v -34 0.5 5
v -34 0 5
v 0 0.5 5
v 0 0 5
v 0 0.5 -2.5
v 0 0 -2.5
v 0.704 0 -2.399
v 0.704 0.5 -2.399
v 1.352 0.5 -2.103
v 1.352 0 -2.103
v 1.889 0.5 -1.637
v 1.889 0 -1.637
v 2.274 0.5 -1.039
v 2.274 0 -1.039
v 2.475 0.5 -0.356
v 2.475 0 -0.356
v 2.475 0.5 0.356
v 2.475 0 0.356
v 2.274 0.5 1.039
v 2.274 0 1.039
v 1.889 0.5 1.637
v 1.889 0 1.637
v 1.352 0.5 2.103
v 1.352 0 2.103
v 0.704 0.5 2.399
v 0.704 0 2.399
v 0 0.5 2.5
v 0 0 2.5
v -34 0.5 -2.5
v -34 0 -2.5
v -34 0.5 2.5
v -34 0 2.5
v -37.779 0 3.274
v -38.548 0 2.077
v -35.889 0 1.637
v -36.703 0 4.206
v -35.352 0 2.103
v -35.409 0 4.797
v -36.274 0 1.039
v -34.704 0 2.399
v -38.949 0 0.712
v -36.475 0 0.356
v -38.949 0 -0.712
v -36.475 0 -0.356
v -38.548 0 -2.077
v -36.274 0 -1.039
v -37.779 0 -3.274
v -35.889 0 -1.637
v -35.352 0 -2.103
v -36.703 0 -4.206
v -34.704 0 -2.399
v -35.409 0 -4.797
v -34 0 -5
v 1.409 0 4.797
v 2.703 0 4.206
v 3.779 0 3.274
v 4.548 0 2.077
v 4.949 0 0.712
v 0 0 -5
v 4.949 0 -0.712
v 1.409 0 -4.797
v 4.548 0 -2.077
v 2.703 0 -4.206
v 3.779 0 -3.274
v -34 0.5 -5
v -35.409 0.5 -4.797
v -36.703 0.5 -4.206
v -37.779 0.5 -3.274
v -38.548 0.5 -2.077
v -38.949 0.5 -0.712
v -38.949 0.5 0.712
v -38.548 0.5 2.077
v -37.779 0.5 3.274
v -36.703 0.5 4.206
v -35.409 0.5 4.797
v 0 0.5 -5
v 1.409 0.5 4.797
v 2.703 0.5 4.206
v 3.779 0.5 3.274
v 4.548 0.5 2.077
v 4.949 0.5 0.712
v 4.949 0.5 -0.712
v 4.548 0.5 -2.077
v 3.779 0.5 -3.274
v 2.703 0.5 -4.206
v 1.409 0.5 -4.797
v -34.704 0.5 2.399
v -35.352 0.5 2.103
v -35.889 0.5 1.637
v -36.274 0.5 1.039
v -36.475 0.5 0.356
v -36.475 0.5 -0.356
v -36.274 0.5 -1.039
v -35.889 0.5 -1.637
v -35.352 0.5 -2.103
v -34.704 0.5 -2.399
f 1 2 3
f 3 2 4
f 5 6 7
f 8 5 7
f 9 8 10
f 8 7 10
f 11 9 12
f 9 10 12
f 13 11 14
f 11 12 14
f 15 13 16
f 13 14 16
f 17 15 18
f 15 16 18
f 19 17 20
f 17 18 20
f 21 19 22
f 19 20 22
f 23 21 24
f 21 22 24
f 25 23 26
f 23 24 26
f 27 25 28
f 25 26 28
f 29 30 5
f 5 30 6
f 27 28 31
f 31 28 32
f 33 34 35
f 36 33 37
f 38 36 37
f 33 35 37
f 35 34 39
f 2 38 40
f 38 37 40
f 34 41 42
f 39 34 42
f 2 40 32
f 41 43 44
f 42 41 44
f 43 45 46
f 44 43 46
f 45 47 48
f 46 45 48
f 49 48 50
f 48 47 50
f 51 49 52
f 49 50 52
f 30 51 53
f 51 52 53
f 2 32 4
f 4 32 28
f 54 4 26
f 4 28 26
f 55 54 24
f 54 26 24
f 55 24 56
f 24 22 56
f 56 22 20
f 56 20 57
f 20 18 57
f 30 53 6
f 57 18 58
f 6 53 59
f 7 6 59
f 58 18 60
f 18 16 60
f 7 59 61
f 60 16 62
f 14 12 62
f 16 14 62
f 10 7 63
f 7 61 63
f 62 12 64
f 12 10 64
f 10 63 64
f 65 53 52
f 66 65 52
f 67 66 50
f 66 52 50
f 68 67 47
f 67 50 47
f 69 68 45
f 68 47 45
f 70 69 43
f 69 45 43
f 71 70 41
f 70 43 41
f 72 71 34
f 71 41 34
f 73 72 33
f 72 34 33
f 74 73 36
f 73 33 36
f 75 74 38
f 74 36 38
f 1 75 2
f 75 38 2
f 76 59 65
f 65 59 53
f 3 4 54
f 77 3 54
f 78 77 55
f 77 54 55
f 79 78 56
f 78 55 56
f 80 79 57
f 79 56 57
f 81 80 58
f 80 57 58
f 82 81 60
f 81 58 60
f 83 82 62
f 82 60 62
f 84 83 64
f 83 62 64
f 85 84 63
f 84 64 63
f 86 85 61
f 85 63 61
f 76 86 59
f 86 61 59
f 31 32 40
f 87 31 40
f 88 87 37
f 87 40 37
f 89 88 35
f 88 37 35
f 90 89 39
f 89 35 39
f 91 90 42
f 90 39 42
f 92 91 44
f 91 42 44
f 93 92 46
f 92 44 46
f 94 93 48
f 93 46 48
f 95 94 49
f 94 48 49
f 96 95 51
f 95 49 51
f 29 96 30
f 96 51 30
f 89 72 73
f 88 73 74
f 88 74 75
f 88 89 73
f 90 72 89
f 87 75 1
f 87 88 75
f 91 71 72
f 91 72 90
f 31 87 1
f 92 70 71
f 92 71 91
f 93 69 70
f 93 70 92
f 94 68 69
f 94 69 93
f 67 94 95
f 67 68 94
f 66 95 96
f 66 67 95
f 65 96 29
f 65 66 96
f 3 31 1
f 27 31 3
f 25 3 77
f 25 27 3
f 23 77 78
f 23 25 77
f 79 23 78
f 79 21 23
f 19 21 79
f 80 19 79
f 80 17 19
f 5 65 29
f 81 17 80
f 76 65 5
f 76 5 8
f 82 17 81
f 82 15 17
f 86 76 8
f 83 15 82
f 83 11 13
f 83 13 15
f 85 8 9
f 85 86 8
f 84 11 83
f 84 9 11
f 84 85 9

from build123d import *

# Parameters (mm, degrees)
BOSS_EXTRUDE1_DEPTH = 0.5


with BuildPart() as part:
    # Sketch1 → Boss-Extrude1 (new body)
    with BuildSketch(Plane(origin=(0, 0, 0), x_dir=(1, 0, 0), z_dir=(0, 1, 0))):
        with BuildLine():
            ThreePointArc((0, -5), (5, 0), (0, 5))
            Line((0, 5), (-34, 5))
            ThreePointArc((-34, 5), (-39, 0), (-34, -5))
            Line((-34, -5), (0, -5))
        make_face()
        with BuildLine():
            ThreePointArc((-34, -2.5), (-36.5, 0), (-34, 2.5))
            Line((-34, 2.5), (0, 2.5))
            ThreePointArc((0, 2.5), (2.5, 0), (0, -2.5))
            Line((0, -2.5), (-34, -2.5))
        make_face(mode=Mode.SUBTRACT)
    extrude(amount=BOSS_EXTRUDE1_DEPTH)


solid = part.part
